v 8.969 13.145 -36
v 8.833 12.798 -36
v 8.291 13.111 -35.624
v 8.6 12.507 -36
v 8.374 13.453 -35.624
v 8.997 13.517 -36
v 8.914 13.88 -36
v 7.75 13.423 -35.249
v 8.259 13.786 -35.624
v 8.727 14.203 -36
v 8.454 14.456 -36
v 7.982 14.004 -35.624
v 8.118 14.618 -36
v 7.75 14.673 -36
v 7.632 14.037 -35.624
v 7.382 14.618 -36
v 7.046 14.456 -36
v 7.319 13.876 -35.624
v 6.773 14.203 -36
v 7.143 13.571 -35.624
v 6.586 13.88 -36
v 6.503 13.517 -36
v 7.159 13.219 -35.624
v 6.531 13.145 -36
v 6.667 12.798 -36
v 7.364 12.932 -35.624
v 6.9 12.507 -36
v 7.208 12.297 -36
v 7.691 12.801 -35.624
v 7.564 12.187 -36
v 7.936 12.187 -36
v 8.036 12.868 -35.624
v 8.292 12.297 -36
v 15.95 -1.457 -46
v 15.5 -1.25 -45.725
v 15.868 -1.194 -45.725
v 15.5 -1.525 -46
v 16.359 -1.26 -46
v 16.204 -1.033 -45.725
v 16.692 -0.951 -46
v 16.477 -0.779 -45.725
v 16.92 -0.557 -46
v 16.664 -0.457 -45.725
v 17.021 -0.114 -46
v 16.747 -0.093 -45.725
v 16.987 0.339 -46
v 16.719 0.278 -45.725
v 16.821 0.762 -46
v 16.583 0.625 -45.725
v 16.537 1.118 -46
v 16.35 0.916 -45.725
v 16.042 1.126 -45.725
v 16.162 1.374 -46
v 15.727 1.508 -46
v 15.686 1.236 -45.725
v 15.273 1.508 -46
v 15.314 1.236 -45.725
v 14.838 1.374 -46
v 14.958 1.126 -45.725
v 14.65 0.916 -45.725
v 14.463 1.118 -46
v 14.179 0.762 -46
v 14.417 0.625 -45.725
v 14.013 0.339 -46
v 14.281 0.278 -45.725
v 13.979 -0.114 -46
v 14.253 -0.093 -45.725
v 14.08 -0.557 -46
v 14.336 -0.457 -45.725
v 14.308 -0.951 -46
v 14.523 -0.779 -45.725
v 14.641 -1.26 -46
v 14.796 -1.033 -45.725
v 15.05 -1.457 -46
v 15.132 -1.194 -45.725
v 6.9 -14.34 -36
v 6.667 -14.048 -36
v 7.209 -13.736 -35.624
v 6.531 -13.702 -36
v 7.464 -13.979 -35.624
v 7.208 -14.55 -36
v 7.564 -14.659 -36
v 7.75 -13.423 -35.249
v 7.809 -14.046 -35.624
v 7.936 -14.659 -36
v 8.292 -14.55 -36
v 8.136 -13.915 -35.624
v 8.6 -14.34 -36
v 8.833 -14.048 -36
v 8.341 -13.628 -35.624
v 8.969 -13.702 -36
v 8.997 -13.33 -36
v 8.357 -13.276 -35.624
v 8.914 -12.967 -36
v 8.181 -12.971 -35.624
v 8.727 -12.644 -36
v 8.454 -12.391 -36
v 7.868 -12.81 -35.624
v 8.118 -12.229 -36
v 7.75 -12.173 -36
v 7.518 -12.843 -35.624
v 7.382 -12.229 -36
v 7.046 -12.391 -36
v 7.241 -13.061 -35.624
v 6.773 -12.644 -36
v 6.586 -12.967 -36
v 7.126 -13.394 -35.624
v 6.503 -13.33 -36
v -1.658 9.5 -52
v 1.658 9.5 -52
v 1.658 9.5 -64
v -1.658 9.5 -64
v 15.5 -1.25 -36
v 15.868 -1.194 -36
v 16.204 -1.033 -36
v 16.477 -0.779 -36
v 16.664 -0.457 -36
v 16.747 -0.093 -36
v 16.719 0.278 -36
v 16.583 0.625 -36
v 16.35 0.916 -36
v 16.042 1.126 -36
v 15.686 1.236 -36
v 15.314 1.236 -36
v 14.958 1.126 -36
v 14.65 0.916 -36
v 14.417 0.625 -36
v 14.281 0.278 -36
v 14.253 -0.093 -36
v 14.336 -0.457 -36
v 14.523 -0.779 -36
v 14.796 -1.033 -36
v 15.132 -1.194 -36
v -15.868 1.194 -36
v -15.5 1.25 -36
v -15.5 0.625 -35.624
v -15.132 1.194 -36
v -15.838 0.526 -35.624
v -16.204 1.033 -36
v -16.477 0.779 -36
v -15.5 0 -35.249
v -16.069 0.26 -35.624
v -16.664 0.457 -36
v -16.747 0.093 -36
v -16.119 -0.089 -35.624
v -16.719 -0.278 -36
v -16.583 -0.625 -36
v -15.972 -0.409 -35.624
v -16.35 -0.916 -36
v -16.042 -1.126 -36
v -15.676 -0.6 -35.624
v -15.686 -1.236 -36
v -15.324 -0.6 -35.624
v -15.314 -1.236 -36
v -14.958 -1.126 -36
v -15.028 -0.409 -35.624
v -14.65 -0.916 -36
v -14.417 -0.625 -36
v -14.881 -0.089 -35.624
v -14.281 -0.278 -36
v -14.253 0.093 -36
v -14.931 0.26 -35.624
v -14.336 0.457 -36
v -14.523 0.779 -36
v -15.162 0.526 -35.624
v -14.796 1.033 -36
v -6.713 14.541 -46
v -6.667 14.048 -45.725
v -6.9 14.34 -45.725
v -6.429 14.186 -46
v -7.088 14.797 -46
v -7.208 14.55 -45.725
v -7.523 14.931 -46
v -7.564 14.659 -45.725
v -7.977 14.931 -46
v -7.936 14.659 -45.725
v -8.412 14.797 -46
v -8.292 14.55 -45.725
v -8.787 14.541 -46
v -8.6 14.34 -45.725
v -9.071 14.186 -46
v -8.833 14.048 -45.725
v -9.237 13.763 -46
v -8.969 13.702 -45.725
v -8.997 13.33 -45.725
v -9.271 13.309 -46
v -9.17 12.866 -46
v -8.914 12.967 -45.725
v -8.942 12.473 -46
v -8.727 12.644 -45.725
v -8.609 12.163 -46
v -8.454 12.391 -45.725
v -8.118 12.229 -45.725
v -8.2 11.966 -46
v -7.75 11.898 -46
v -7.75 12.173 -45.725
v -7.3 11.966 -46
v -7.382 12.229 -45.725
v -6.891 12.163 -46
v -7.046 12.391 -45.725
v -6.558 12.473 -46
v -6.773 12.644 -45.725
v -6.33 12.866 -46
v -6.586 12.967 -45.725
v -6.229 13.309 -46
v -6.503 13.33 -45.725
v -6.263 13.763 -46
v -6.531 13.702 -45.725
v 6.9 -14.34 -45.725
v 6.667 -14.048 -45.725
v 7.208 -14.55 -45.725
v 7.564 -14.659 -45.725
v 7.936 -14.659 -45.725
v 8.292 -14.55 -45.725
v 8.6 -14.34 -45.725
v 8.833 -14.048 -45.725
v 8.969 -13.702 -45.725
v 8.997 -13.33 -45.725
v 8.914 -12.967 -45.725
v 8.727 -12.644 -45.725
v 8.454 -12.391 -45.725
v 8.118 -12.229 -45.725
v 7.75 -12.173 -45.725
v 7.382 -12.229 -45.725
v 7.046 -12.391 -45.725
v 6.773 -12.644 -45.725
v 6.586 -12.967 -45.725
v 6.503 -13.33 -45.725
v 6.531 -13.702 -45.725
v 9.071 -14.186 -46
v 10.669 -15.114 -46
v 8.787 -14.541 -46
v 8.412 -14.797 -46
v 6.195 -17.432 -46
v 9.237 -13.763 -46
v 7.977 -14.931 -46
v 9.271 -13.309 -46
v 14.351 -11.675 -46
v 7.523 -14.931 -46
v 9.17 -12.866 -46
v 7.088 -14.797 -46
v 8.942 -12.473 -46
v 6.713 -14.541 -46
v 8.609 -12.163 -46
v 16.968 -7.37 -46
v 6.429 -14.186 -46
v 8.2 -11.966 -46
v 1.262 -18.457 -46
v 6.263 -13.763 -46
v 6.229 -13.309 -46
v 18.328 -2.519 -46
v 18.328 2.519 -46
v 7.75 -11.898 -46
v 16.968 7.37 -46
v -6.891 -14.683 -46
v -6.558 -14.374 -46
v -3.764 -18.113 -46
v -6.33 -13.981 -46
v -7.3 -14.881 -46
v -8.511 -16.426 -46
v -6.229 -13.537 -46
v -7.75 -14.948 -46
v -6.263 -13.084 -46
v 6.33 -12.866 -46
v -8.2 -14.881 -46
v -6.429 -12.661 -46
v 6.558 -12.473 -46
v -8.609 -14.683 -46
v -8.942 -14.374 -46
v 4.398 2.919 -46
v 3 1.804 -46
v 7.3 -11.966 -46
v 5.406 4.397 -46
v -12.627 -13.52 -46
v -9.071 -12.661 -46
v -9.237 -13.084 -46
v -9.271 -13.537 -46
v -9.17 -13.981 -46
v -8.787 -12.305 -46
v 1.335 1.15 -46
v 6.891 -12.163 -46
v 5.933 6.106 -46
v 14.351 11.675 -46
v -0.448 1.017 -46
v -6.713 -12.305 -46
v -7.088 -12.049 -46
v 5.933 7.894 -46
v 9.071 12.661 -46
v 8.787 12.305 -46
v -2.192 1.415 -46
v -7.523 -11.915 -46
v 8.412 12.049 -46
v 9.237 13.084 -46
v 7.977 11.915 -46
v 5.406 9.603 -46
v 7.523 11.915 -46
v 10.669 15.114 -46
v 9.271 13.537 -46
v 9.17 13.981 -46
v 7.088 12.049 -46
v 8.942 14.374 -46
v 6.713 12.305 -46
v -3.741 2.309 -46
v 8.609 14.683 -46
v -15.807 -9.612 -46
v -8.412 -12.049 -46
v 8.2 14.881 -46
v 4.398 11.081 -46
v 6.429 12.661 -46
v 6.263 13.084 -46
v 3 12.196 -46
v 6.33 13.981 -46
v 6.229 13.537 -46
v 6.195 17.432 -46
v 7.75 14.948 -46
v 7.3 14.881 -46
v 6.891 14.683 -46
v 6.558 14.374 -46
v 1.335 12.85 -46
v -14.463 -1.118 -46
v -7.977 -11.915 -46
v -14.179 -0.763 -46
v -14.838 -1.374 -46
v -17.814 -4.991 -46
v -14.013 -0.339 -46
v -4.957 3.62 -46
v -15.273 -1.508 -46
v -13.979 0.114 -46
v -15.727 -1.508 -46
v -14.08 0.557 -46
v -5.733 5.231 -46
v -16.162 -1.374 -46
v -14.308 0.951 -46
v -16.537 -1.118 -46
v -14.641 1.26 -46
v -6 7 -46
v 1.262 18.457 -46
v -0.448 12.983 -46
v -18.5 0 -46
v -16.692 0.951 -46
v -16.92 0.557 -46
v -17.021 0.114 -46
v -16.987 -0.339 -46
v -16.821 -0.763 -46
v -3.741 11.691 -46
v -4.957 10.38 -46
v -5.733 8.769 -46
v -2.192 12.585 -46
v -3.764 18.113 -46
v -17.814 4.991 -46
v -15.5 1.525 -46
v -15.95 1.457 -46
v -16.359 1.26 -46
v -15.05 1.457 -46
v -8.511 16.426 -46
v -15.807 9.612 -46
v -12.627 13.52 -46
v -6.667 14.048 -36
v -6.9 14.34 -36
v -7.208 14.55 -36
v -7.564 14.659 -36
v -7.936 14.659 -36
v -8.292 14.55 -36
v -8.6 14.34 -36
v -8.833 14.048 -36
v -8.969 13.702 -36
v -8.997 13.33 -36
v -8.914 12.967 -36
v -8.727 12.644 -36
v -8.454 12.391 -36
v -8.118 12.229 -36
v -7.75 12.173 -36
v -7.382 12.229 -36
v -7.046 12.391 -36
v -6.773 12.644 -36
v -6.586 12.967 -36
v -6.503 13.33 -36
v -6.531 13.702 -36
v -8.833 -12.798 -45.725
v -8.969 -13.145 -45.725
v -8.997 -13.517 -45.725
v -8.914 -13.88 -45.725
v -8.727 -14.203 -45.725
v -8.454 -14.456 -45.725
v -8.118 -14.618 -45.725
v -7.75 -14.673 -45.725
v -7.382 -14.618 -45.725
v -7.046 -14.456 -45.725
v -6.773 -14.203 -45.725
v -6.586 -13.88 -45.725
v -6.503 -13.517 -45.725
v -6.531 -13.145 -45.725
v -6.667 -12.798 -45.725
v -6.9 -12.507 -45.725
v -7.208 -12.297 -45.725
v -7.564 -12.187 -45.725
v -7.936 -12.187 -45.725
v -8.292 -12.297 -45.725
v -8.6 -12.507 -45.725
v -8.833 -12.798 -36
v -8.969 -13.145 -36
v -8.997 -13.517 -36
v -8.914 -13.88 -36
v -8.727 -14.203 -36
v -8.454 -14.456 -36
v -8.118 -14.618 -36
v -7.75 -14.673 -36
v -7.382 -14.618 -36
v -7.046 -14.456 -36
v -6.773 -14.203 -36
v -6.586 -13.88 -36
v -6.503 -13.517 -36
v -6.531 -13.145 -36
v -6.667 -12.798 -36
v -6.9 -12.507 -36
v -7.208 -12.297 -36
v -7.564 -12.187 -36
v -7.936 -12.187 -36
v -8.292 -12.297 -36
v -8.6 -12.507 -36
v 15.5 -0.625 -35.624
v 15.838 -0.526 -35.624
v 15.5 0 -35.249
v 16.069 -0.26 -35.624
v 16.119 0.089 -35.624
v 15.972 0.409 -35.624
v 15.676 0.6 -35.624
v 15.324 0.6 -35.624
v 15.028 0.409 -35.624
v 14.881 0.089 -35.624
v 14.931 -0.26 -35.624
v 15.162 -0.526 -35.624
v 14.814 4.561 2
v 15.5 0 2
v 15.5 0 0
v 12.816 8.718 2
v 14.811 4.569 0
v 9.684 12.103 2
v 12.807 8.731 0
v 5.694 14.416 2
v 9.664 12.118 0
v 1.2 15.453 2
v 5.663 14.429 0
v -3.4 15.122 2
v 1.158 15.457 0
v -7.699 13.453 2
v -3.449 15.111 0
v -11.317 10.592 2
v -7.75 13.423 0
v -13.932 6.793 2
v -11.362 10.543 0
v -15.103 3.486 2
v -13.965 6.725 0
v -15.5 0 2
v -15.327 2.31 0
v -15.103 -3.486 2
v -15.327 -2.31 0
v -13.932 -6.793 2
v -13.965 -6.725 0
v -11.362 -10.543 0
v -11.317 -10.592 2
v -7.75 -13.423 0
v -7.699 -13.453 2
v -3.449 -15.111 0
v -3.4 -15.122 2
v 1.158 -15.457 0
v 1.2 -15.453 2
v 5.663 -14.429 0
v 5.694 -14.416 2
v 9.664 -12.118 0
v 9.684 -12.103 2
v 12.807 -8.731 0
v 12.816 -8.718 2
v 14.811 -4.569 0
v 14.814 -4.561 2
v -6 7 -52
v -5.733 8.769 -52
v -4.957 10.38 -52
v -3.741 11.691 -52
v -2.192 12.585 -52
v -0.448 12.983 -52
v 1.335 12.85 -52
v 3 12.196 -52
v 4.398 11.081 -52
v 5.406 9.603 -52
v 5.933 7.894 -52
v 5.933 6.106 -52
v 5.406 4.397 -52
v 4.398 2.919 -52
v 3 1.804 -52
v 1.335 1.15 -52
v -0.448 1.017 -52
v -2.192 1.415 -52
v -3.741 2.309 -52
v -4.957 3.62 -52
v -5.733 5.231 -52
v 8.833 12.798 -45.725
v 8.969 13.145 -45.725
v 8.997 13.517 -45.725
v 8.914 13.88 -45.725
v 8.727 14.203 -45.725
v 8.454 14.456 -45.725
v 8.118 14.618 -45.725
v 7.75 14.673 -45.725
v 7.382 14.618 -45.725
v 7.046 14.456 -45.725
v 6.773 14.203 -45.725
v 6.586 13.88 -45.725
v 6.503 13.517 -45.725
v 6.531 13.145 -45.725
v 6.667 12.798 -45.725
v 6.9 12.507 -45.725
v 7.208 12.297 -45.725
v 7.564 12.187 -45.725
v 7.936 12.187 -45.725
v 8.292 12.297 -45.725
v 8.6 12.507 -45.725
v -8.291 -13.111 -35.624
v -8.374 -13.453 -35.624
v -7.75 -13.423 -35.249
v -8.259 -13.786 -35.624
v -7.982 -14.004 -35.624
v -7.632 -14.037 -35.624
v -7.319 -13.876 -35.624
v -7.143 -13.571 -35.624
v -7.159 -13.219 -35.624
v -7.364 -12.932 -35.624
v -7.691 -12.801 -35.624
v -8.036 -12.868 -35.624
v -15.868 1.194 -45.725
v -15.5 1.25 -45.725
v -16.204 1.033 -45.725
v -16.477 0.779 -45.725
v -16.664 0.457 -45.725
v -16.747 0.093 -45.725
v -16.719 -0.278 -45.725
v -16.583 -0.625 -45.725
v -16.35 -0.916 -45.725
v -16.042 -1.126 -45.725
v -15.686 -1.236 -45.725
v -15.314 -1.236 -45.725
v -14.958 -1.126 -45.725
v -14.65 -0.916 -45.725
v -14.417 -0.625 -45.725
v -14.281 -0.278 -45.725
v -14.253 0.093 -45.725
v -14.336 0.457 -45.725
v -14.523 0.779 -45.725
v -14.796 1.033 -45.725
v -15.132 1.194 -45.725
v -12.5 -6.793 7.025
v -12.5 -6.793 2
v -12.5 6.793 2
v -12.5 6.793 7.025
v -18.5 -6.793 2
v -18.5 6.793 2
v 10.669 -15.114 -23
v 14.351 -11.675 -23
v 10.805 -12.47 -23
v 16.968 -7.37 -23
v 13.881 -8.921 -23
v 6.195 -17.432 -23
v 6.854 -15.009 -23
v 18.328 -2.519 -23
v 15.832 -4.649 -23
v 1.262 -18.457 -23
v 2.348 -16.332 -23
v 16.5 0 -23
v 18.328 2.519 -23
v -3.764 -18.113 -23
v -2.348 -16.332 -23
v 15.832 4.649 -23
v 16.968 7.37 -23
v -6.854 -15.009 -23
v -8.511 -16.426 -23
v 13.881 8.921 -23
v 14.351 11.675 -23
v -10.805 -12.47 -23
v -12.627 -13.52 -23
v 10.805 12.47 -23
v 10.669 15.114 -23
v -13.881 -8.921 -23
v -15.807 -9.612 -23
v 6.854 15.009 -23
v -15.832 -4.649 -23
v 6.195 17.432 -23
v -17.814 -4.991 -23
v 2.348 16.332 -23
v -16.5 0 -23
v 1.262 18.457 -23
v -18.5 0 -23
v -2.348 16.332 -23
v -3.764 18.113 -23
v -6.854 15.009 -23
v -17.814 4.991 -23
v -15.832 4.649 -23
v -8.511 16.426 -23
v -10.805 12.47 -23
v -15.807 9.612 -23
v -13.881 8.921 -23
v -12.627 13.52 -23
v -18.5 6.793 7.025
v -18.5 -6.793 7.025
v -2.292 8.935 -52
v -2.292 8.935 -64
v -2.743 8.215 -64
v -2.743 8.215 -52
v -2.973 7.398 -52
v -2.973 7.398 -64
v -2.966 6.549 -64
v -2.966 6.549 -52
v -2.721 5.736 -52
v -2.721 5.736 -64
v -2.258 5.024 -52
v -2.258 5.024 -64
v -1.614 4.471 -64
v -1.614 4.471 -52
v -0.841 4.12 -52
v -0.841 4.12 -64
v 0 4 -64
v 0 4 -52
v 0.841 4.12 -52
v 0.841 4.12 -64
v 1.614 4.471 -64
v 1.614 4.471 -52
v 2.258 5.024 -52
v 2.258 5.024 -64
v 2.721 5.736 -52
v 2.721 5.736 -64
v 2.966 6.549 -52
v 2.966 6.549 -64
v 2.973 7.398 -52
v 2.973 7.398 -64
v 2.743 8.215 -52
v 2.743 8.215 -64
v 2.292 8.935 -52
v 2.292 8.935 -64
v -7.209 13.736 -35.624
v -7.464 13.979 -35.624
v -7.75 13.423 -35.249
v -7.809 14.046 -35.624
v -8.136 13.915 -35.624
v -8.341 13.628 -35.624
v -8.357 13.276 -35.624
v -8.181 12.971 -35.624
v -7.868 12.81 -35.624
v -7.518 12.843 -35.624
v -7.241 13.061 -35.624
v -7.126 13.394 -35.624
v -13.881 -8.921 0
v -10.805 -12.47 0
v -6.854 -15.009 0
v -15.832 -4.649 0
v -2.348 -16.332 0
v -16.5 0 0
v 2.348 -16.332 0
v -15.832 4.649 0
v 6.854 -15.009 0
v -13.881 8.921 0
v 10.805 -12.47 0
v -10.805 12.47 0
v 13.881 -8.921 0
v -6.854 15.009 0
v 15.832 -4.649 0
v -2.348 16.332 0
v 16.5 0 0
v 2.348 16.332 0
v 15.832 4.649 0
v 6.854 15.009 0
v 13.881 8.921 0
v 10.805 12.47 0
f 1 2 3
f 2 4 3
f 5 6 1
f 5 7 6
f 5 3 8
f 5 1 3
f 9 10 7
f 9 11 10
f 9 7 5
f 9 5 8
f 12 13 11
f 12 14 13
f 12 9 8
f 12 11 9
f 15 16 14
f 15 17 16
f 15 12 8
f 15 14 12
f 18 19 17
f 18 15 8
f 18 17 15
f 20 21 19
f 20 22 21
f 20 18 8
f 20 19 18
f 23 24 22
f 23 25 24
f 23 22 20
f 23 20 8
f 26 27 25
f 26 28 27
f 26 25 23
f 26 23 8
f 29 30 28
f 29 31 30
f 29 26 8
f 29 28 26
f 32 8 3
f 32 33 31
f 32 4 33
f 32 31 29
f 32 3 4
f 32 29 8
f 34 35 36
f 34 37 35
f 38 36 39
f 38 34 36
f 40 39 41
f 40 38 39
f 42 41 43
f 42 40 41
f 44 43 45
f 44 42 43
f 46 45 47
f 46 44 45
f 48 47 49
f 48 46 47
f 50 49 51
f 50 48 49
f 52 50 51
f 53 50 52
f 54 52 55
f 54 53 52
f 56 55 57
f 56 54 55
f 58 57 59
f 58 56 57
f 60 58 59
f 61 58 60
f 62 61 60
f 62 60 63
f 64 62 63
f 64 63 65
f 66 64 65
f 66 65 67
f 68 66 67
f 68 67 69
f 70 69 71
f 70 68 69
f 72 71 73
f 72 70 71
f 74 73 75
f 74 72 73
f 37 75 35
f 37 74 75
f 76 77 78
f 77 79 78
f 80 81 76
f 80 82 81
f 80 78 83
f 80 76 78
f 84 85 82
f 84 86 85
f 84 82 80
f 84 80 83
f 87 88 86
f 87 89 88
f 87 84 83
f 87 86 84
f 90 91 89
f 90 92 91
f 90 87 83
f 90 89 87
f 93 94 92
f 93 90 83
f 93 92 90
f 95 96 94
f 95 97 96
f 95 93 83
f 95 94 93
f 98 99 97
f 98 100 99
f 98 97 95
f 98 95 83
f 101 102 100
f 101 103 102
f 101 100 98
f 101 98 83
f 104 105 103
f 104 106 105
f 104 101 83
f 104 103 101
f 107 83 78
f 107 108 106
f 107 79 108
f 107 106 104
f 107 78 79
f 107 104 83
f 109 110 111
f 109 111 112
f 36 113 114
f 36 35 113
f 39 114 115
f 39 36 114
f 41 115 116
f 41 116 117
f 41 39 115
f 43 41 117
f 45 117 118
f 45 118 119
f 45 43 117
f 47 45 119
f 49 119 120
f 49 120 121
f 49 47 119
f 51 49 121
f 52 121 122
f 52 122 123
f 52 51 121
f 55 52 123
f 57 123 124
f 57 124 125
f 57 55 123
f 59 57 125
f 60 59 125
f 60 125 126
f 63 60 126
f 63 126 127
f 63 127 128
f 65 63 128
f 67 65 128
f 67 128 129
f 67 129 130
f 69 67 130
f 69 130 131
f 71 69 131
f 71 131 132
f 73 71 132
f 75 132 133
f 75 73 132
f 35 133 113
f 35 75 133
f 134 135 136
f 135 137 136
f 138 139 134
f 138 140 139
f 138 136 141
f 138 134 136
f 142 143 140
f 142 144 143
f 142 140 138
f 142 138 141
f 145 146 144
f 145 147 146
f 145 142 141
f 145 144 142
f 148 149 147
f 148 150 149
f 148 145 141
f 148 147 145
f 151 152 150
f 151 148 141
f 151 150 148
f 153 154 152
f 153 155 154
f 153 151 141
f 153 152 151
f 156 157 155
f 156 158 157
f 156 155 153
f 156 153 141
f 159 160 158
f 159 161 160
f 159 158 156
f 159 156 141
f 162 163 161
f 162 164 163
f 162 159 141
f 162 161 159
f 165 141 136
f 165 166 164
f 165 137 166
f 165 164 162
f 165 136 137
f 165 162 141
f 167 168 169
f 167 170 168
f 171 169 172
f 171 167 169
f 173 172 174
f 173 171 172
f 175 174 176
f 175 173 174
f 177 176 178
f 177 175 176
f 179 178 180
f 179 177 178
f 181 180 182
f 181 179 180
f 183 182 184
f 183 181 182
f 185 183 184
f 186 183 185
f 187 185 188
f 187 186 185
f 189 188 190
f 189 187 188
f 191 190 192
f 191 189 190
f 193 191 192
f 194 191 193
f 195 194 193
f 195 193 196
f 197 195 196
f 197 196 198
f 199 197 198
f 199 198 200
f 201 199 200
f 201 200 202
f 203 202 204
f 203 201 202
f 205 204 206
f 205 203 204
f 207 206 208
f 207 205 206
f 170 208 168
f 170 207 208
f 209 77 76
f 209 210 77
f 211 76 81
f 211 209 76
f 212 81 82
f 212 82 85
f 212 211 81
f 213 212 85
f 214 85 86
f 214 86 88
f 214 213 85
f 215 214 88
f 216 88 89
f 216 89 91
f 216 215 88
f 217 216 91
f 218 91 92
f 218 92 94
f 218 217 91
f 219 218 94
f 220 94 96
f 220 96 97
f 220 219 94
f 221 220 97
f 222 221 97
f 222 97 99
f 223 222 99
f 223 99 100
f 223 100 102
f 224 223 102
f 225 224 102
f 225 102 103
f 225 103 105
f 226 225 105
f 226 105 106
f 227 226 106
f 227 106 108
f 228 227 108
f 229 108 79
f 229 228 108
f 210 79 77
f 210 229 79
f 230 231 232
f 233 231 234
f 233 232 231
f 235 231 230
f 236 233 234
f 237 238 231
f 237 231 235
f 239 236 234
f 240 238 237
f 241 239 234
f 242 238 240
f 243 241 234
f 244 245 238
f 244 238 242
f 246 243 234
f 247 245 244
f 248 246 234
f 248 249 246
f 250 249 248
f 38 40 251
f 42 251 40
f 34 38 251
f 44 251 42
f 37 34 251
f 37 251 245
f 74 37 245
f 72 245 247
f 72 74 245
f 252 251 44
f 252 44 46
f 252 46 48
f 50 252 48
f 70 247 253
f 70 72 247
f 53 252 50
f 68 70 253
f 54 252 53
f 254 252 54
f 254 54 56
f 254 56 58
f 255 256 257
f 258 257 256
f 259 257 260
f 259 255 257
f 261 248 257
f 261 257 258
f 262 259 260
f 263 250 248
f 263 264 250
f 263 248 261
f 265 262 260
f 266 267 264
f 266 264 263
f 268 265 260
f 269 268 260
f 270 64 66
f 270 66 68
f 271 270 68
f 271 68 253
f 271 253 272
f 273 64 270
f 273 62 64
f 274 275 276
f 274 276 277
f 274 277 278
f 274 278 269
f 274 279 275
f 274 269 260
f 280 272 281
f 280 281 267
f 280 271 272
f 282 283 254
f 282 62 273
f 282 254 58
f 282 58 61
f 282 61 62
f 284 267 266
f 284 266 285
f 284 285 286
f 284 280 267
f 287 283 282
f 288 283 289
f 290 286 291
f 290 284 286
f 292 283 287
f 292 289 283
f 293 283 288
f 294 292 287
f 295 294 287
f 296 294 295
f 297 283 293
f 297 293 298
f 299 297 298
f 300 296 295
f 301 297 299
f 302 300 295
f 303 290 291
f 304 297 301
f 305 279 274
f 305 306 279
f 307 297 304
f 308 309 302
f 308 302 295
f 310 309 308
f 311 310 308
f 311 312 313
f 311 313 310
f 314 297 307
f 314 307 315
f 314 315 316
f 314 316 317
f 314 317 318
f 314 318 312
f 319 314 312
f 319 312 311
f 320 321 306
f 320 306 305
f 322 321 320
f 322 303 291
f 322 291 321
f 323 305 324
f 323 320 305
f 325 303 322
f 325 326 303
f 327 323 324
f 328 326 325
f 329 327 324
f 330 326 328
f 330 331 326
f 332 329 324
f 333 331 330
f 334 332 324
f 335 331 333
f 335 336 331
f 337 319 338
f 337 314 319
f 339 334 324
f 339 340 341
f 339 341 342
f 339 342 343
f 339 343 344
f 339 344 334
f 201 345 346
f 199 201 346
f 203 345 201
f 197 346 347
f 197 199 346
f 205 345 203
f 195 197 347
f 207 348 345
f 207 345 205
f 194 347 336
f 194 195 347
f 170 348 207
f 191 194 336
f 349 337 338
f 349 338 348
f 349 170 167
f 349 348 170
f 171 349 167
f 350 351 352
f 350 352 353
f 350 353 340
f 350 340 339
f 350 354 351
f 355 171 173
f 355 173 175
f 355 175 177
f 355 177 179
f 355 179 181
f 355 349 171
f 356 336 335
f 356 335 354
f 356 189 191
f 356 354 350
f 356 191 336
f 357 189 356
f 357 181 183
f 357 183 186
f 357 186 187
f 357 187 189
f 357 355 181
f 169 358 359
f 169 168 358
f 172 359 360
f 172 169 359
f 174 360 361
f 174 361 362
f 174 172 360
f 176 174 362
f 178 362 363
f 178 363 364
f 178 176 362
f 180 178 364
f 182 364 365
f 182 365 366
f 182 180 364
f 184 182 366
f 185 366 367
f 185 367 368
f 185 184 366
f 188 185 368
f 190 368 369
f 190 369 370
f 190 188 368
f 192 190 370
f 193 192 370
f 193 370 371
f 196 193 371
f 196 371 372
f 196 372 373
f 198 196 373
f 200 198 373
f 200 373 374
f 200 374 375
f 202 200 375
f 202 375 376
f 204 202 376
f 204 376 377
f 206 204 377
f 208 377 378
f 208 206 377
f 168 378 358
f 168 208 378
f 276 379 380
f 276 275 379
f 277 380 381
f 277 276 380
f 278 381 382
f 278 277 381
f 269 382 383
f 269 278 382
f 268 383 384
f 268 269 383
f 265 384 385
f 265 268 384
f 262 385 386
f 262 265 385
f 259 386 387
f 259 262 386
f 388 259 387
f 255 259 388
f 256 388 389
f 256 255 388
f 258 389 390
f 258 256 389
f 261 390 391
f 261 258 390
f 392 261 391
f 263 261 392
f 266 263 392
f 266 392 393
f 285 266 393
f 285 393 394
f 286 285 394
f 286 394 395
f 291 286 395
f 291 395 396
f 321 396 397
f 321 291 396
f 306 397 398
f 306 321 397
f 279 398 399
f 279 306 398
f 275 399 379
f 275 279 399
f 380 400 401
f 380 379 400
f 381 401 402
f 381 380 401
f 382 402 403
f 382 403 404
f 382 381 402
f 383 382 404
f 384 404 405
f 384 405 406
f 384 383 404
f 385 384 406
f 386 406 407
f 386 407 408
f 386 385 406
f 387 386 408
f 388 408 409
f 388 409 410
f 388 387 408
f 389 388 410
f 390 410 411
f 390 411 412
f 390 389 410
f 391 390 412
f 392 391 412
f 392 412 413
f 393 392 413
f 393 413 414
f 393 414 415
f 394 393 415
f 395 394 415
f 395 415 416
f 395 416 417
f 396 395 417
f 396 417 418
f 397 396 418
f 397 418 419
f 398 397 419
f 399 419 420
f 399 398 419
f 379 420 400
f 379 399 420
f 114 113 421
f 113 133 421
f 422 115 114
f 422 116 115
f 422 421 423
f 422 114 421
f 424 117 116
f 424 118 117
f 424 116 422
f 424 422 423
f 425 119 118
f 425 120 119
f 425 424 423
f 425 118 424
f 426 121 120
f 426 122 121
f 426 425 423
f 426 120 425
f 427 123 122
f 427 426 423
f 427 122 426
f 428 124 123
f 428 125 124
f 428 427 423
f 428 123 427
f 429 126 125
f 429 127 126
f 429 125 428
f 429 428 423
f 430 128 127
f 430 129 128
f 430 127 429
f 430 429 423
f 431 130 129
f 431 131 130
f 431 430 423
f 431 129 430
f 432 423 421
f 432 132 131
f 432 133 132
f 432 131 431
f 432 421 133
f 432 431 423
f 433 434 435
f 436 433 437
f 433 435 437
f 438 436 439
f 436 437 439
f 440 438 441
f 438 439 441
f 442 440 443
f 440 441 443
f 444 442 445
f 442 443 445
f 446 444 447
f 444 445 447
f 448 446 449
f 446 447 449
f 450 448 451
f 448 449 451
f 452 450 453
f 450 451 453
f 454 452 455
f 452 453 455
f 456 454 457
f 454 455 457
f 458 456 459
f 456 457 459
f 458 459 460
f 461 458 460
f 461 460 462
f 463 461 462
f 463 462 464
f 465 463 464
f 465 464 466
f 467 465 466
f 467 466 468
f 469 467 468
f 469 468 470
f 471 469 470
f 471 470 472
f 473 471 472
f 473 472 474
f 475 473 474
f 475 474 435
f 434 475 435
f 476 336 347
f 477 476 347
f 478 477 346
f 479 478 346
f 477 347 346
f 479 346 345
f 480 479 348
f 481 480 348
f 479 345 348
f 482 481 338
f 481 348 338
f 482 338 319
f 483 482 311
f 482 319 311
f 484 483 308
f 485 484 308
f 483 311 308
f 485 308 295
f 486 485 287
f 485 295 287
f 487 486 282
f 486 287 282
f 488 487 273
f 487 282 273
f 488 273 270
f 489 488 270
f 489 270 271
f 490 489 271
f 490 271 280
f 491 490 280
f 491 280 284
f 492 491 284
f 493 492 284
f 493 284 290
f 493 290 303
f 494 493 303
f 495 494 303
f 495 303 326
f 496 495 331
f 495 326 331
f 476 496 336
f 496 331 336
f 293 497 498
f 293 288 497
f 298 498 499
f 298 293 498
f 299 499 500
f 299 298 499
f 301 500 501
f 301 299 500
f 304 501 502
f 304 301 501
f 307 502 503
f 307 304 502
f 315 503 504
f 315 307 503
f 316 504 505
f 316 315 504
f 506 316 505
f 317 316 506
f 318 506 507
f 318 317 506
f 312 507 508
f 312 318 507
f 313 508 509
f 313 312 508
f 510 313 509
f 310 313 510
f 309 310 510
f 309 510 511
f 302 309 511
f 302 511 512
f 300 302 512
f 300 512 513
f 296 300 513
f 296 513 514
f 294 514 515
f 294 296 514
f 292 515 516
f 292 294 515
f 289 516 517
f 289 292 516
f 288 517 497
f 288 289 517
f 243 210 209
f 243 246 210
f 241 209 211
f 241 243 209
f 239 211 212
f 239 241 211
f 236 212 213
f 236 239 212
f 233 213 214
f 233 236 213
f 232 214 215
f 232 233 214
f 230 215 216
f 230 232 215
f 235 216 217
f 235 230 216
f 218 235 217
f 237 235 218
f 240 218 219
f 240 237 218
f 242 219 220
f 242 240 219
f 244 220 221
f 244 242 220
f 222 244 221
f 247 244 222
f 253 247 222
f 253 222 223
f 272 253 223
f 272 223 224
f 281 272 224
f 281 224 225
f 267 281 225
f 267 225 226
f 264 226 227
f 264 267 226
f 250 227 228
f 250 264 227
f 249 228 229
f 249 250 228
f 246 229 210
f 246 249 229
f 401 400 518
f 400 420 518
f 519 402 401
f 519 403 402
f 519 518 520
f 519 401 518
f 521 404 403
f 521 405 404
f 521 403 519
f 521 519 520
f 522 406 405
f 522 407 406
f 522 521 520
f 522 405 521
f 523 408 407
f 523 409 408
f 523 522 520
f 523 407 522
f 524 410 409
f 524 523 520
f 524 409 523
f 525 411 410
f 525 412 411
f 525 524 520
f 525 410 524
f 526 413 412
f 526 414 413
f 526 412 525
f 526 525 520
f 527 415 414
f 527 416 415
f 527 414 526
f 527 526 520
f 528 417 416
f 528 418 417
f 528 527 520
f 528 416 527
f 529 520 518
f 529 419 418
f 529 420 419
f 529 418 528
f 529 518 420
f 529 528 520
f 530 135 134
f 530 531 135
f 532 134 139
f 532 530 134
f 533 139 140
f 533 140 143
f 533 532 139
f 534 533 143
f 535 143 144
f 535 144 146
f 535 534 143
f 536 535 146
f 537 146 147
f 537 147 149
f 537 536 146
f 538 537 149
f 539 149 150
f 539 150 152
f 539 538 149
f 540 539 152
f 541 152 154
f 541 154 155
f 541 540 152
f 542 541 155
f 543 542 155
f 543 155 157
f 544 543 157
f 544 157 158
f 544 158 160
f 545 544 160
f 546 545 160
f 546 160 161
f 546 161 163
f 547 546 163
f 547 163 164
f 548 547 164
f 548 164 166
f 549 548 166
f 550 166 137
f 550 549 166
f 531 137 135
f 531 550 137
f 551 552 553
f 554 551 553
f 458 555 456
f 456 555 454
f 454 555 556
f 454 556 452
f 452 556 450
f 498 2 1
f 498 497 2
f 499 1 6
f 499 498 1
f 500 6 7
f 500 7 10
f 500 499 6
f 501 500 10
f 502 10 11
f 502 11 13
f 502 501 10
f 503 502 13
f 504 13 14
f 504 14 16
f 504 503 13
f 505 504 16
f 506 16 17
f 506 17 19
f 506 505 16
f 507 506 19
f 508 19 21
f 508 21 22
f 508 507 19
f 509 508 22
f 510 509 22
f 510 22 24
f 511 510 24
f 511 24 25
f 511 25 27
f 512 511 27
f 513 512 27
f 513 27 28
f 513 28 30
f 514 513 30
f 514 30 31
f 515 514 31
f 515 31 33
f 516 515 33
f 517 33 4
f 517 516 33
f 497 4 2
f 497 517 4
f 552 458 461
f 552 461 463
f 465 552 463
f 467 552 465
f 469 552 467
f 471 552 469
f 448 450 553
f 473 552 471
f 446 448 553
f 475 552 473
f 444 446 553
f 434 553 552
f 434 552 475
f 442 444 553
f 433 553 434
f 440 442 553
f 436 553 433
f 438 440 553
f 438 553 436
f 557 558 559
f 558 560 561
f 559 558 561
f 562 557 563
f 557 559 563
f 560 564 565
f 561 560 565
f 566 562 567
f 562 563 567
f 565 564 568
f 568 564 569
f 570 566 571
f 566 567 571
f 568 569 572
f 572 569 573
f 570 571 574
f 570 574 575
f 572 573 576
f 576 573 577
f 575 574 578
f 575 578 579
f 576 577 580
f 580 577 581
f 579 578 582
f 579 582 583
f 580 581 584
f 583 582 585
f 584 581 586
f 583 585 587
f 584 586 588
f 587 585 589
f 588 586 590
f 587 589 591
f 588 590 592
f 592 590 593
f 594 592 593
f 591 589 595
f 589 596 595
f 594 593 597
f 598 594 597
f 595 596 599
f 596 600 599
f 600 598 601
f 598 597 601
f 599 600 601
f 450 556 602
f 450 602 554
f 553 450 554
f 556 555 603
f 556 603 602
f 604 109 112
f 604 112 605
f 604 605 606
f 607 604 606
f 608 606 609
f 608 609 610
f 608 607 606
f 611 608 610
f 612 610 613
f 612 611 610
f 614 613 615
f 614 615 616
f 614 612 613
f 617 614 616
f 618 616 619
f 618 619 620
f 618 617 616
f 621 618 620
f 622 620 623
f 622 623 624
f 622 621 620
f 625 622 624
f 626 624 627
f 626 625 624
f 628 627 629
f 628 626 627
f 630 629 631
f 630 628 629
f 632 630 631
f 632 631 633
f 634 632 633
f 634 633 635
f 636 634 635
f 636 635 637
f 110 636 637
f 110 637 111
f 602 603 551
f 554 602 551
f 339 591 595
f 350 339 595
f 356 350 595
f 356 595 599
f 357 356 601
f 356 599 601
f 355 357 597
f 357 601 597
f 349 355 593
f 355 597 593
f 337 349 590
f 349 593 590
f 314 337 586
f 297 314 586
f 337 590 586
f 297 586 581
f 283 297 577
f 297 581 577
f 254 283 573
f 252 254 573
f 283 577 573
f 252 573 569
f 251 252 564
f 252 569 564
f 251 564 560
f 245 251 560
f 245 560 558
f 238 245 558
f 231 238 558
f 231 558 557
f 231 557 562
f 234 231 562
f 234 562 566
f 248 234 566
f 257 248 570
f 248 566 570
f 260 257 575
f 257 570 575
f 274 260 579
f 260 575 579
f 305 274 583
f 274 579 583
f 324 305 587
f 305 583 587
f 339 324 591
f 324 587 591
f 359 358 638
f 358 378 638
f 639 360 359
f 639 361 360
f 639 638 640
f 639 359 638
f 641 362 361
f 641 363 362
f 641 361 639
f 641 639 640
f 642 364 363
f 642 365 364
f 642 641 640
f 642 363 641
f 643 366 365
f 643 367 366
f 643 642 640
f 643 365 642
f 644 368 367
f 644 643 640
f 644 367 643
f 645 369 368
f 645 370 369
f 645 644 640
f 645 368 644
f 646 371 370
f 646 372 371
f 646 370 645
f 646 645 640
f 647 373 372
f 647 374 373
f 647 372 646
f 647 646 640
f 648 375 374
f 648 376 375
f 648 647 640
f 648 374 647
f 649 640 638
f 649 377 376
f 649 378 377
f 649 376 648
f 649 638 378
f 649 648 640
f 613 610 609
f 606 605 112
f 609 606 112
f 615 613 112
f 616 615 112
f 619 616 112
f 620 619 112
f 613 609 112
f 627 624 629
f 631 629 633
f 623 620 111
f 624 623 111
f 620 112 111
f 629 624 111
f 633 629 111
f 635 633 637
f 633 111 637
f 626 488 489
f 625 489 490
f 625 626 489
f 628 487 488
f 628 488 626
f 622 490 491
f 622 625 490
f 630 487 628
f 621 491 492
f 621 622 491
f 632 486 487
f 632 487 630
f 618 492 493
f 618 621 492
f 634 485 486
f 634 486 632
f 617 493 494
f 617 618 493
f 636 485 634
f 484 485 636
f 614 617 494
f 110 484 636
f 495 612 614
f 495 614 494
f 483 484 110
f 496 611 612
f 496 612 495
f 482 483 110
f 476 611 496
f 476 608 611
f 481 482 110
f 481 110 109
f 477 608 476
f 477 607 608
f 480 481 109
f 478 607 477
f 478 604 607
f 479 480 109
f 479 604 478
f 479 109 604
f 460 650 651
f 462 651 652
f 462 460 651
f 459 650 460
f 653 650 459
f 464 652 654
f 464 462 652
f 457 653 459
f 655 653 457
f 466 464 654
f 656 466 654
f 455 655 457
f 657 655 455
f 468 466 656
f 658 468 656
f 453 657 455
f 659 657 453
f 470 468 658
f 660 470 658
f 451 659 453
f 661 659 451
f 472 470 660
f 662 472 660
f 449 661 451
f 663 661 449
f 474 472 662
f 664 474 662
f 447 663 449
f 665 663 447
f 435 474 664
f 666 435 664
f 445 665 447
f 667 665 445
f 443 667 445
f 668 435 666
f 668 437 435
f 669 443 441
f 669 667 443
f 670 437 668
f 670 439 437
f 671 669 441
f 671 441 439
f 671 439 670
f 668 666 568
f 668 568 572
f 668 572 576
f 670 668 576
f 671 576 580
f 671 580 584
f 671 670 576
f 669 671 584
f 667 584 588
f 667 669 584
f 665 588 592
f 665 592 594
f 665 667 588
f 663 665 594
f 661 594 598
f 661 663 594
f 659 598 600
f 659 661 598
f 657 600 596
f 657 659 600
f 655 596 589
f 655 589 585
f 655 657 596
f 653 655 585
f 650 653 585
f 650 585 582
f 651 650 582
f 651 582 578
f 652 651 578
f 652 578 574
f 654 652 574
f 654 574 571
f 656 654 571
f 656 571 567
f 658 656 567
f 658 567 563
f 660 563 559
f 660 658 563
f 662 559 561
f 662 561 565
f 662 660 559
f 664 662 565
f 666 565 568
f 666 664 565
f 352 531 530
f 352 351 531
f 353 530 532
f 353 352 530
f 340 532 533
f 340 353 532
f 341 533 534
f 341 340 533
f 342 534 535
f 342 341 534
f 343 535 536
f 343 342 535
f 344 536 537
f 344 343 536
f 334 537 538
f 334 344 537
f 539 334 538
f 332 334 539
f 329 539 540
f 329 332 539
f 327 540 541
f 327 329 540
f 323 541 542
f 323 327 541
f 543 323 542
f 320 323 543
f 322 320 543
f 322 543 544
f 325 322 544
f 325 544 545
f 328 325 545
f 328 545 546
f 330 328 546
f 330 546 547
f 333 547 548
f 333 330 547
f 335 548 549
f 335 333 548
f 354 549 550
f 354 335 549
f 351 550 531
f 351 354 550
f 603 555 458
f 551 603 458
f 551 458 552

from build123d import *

# Parameters (mm, degrees)
SKETCH1_R           = 16.5
BOSS_EXTRUDE1_DEPTH = 23
SKETCH2_R           = 18.5
BOSS_EXTRUDE2_DEPTH = 23
SKETCH3_R           = 6
BOSS_EXTRUDE3_DEPTH = 6
BOSS_EXTRUDE4_DEPTH = 12
CIRPATTERN1_COUNT   = 6
SKETCH8_R           = 15.5
BOSS_EXTRUDE5_DEPTH = 2
SKETCH10_W          = 6
SKETCH10_H          = 13.585847052
BOSS_EXTRUDE6_DEPTH = 5.02500011


with BuildPart() as part:
    # Sketch1 → Boss-Extrude1 (new body)
    with BuildSketch(Plane.XY):
        Circle(SKETCH1_R)
    extrude(amount=-BOSS_EXTRUDE1_DEPTH)

    # Sketch2 → Boss-Extrude2 (add)
    with BuildSketch(Plane(origin=(0, 0, -23), x_dir=(-1, 0, 0), z_dir=(0, 0, -1))):
        Circle(SKETCH2_R)
    extrude(amount=BOSS_EXTRUDE2_DEPTH)

    # Sketch3 → Boss-Extrude3 (add)
    with BuildSketch(Plane(origin=(0, 0, -46), x_dir=(-1, 0, 0), z_dir=(0, 0, -1))):
        with Locations((0, 7)):
            Circle(SKETCH3_R)
    extrude(amount=BOSS_EXTRUDE3_DEPTH)

    # Sketch4 → Boss-Extrude4 (add)
    with BuildSketch(Plane(origin=(0, 0, -52), x_dir=(-1, 0, 0), z_dir=(0, 0, -1))):
        with BuildLine():
            Line((-1.658312395, 9.5), (1.658312395, 9.5))
            ThreePointArc((1.658312395, 9.5), (0, 4), (-1.658312395, 9.5))
        make_face()
    extrude(amount=BOSS_EXTRUDE4_DEPTH)

    # Sketch7 → M3x0.5 Tapped Hole1 (revolve, cut)
    with BuildSketch(Plane(origin=(-15.5, 0, -46), x_dir=(0, 1, 0), z_dir=(1, 0, 0))):
        Polygon((0, 0), (0, 10.751081174), (1.25, 10.0000054), (1.25, 0.275), (1.525, 0), align=None)
    m3x0_5_tapped_hole1 = revolve(axis=Axis((-15.5, 0, -52.35), (0, 0, 1)), mode=Mode.SUBTRACT)

    # CirPattern1: M3x0.5 Tapped Hole1 ×6 about axis
    cirpattern1_axis = Axis((0, 0, 0), (0, 0, 1))
    for i in range(1, CIRPATTERN1_COUNT):
        add(m3x0_5_tapped_hole1.rotate(cirpattern1_axis, i * 360 / CIRPATTERN1_COUNT), mode=Mode.SUBTRACT)

    # Sketch8 → Boss-Extrude5 (add)
    with BuildSketch(Plane.XY):
        Circle(SKETCH8_R)
    extrude(amount=BOSS_EXTRUDE5_DEPTH)

    # Sketch10 → Boss-Extrude6 (add)
    with BuildSketch(Plane.XY.offset(2)):
        with Locations((-15.5, 0)):
            Rectangle(SKETCH10_W, SKETCH10_H)
    extrude(amount=BOSS_EXTRUDE6_DEPTH)


solid = part.part
